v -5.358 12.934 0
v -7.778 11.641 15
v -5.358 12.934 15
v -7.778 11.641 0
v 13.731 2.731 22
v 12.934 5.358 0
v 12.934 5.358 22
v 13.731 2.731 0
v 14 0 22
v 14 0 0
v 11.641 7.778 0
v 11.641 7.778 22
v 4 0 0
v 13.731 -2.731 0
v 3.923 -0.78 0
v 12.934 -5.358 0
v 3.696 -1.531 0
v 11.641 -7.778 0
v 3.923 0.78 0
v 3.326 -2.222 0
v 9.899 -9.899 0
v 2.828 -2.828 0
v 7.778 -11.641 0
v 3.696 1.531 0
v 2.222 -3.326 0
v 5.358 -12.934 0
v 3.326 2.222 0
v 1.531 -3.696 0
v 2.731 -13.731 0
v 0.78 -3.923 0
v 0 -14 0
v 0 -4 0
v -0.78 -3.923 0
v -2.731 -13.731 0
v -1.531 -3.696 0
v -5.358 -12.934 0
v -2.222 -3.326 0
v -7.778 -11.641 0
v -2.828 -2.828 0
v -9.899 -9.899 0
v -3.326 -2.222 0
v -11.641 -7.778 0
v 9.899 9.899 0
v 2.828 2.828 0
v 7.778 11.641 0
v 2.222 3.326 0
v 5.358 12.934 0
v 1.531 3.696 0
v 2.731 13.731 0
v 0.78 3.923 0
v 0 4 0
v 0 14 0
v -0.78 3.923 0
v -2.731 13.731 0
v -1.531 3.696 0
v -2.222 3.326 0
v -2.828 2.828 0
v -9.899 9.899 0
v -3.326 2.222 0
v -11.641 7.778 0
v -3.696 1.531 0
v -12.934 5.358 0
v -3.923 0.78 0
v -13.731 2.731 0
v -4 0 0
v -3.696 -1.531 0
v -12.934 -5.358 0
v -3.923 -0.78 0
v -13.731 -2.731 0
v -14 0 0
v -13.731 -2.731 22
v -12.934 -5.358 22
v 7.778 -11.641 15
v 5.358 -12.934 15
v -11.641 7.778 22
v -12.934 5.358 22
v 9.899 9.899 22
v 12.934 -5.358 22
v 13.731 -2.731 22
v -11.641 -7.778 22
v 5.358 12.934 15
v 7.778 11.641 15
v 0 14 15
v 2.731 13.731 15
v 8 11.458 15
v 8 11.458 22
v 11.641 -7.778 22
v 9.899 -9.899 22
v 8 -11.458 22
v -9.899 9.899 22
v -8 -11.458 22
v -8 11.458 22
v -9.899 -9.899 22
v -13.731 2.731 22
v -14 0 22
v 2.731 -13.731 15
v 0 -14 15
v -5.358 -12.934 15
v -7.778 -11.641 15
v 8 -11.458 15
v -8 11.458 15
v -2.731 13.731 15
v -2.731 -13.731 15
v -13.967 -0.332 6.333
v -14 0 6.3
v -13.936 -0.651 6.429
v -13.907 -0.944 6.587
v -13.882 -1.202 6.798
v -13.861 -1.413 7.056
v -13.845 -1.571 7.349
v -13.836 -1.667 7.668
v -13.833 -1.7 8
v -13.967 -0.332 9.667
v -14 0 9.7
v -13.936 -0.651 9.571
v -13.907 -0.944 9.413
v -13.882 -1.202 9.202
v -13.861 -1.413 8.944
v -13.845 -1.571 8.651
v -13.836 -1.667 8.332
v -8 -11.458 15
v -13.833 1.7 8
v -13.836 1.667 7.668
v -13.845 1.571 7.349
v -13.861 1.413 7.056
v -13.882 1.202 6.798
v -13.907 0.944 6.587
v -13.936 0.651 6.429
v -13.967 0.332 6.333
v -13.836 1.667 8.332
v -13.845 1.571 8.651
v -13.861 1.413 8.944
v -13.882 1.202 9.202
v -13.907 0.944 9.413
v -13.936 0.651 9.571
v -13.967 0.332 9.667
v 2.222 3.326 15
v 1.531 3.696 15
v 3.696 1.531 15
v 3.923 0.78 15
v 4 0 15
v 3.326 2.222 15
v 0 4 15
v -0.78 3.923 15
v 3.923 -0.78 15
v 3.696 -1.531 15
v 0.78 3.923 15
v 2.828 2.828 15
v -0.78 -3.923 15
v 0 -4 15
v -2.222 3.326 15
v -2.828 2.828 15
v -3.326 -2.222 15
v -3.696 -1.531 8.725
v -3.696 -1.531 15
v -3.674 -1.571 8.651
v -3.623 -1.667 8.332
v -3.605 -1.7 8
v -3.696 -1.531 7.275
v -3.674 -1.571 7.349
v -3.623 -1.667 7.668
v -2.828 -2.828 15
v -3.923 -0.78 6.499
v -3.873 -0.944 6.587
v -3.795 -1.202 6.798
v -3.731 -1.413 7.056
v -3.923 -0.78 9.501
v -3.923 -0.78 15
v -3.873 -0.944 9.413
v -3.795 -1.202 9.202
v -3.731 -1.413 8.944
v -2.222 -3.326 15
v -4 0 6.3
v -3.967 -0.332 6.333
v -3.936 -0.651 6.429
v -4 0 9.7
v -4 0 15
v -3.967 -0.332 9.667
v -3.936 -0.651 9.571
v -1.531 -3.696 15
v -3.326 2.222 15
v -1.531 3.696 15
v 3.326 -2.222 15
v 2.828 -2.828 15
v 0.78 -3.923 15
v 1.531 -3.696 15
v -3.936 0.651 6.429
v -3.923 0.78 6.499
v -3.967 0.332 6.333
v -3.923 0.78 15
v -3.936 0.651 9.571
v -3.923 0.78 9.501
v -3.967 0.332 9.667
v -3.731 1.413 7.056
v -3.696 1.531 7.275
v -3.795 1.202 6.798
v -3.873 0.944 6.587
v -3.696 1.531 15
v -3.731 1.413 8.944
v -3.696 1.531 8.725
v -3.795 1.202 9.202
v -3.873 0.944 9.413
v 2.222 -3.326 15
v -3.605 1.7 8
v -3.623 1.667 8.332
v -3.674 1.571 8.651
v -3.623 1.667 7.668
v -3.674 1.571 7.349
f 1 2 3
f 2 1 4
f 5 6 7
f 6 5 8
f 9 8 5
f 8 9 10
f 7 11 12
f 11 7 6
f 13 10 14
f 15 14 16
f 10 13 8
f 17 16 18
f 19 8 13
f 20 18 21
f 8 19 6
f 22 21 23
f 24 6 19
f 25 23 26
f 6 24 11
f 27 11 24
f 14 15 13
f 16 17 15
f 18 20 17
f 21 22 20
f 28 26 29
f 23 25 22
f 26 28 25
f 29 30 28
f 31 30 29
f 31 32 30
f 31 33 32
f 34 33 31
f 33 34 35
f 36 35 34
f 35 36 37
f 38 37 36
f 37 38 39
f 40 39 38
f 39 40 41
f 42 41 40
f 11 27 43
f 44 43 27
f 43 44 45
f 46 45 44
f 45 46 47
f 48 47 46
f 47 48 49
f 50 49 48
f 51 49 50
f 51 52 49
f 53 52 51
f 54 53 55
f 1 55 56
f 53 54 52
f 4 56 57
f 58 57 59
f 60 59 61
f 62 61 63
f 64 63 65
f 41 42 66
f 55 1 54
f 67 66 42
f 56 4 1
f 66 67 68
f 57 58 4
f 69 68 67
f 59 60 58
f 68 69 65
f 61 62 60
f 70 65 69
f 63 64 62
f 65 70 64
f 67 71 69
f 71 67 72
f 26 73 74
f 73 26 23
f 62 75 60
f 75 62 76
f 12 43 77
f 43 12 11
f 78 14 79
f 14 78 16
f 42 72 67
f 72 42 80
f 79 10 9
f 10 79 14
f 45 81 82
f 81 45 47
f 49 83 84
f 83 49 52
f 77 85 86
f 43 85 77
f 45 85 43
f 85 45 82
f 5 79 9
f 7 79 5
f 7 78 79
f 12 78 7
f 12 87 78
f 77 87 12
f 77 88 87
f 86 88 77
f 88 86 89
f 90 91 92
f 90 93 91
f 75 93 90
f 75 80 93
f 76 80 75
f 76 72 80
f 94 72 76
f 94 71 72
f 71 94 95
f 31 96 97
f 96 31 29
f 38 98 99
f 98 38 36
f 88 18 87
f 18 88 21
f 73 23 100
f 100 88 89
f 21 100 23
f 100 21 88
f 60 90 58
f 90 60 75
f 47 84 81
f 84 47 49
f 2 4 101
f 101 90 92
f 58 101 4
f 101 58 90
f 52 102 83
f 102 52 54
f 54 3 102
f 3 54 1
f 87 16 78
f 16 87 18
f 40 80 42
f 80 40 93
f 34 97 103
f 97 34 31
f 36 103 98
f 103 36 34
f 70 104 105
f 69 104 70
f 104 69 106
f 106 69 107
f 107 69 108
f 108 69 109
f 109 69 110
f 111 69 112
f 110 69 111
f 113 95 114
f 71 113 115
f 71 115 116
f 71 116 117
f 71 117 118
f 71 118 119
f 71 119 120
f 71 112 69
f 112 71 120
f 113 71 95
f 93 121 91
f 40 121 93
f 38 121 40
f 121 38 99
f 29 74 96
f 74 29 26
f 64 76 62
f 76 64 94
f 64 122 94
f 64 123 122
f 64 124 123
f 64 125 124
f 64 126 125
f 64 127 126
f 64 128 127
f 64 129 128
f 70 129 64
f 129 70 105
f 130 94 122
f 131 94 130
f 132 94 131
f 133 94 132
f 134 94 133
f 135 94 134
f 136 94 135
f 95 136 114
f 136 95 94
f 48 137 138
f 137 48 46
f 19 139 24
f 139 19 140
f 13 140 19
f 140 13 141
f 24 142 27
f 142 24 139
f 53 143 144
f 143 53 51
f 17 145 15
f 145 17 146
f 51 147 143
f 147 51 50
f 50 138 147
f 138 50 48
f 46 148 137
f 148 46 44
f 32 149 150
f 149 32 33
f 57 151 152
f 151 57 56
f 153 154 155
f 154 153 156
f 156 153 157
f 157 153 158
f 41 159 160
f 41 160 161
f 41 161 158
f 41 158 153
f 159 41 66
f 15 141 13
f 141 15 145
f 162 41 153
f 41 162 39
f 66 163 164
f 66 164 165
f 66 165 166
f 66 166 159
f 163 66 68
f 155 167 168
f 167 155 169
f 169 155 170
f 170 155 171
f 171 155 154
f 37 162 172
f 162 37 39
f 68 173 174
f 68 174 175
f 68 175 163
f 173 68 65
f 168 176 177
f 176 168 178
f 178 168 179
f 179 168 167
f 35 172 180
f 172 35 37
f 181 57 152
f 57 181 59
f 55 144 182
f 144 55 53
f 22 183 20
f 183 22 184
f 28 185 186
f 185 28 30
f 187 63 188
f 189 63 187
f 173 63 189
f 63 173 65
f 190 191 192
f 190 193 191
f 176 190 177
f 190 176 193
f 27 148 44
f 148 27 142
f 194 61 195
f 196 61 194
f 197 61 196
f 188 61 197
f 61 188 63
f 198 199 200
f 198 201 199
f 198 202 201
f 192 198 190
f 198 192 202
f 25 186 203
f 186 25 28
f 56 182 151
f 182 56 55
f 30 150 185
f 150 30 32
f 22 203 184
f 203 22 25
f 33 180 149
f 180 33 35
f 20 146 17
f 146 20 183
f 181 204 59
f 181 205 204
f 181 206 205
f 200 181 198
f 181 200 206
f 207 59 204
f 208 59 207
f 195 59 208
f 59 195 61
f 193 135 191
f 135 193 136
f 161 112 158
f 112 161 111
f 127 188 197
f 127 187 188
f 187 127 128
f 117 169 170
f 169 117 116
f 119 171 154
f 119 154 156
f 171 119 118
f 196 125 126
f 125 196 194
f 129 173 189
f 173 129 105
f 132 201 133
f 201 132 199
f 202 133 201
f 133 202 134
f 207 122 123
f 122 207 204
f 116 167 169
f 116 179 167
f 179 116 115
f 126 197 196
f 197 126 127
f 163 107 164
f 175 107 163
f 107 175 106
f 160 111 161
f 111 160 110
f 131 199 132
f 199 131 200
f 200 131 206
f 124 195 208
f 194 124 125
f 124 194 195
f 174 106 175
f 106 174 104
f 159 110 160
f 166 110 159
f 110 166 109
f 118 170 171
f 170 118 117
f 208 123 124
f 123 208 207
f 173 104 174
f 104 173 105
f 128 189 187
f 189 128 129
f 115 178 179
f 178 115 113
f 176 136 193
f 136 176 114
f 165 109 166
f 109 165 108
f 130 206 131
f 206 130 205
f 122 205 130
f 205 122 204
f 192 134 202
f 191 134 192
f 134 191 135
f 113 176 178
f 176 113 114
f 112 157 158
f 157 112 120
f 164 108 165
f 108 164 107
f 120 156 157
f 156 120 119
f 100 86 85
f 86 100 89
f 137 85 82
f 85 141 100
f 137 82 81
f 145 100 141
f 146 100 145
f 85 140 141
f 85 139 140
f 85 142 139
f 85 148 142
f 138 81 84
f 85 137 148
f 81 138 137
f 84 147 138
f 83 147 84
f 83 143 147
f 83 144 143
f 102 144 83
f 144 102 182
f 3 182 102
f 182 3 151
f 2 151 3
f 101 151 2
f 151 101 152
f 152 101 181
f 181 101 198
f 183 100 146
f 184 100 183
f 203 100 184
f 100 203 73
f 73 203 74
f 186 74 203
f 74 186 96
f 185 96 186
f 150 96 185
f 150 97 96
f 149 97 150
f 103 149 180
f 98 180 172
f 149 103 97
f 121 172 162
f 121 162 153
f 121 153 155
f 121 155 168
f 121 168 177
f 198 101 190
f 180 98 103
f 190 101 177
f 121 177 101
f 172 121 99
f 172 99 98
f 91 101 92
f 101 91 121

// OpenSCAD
$fn = 32;

// ----------------------------------------------------------------------
// Oldham coupling hub: 28 x 22 mm
// ----------------------------------------------------------------------

// --- parameters (mm) ---
flange_dia = 28;          // hub diameter
flange_len = 16;          // hub length
hub_bore = 8;             // shaft bore
key_w = 16;               // drive tongue width
tongue_h = 6;             // drive tongue height
set_d = 3.4;              // set screw tap hole

module hub() {
  /* the slot side is a raised disc with a groove milled across it */
  cylinder(h = flange_len + tongue_h, d = flange_dia);
}

difference() {
  hub();
  translate([0, 0, -1]) cylinder(h = flange_len + tongue_h + 2, d = hub_bore);
  translate([-flange_dia / 2 - 1, 0, flange_len * 0.5])
    rotate([0, 90, 0]) cylinder(h = flange_dia / 2 + 2, d = set_d);
  translate([-key_w / 2, -flange_dia / 2 - 1, flange_len - 1])
    cube([key_w, flange_dia + 2, tongue_h + 1]);
}
